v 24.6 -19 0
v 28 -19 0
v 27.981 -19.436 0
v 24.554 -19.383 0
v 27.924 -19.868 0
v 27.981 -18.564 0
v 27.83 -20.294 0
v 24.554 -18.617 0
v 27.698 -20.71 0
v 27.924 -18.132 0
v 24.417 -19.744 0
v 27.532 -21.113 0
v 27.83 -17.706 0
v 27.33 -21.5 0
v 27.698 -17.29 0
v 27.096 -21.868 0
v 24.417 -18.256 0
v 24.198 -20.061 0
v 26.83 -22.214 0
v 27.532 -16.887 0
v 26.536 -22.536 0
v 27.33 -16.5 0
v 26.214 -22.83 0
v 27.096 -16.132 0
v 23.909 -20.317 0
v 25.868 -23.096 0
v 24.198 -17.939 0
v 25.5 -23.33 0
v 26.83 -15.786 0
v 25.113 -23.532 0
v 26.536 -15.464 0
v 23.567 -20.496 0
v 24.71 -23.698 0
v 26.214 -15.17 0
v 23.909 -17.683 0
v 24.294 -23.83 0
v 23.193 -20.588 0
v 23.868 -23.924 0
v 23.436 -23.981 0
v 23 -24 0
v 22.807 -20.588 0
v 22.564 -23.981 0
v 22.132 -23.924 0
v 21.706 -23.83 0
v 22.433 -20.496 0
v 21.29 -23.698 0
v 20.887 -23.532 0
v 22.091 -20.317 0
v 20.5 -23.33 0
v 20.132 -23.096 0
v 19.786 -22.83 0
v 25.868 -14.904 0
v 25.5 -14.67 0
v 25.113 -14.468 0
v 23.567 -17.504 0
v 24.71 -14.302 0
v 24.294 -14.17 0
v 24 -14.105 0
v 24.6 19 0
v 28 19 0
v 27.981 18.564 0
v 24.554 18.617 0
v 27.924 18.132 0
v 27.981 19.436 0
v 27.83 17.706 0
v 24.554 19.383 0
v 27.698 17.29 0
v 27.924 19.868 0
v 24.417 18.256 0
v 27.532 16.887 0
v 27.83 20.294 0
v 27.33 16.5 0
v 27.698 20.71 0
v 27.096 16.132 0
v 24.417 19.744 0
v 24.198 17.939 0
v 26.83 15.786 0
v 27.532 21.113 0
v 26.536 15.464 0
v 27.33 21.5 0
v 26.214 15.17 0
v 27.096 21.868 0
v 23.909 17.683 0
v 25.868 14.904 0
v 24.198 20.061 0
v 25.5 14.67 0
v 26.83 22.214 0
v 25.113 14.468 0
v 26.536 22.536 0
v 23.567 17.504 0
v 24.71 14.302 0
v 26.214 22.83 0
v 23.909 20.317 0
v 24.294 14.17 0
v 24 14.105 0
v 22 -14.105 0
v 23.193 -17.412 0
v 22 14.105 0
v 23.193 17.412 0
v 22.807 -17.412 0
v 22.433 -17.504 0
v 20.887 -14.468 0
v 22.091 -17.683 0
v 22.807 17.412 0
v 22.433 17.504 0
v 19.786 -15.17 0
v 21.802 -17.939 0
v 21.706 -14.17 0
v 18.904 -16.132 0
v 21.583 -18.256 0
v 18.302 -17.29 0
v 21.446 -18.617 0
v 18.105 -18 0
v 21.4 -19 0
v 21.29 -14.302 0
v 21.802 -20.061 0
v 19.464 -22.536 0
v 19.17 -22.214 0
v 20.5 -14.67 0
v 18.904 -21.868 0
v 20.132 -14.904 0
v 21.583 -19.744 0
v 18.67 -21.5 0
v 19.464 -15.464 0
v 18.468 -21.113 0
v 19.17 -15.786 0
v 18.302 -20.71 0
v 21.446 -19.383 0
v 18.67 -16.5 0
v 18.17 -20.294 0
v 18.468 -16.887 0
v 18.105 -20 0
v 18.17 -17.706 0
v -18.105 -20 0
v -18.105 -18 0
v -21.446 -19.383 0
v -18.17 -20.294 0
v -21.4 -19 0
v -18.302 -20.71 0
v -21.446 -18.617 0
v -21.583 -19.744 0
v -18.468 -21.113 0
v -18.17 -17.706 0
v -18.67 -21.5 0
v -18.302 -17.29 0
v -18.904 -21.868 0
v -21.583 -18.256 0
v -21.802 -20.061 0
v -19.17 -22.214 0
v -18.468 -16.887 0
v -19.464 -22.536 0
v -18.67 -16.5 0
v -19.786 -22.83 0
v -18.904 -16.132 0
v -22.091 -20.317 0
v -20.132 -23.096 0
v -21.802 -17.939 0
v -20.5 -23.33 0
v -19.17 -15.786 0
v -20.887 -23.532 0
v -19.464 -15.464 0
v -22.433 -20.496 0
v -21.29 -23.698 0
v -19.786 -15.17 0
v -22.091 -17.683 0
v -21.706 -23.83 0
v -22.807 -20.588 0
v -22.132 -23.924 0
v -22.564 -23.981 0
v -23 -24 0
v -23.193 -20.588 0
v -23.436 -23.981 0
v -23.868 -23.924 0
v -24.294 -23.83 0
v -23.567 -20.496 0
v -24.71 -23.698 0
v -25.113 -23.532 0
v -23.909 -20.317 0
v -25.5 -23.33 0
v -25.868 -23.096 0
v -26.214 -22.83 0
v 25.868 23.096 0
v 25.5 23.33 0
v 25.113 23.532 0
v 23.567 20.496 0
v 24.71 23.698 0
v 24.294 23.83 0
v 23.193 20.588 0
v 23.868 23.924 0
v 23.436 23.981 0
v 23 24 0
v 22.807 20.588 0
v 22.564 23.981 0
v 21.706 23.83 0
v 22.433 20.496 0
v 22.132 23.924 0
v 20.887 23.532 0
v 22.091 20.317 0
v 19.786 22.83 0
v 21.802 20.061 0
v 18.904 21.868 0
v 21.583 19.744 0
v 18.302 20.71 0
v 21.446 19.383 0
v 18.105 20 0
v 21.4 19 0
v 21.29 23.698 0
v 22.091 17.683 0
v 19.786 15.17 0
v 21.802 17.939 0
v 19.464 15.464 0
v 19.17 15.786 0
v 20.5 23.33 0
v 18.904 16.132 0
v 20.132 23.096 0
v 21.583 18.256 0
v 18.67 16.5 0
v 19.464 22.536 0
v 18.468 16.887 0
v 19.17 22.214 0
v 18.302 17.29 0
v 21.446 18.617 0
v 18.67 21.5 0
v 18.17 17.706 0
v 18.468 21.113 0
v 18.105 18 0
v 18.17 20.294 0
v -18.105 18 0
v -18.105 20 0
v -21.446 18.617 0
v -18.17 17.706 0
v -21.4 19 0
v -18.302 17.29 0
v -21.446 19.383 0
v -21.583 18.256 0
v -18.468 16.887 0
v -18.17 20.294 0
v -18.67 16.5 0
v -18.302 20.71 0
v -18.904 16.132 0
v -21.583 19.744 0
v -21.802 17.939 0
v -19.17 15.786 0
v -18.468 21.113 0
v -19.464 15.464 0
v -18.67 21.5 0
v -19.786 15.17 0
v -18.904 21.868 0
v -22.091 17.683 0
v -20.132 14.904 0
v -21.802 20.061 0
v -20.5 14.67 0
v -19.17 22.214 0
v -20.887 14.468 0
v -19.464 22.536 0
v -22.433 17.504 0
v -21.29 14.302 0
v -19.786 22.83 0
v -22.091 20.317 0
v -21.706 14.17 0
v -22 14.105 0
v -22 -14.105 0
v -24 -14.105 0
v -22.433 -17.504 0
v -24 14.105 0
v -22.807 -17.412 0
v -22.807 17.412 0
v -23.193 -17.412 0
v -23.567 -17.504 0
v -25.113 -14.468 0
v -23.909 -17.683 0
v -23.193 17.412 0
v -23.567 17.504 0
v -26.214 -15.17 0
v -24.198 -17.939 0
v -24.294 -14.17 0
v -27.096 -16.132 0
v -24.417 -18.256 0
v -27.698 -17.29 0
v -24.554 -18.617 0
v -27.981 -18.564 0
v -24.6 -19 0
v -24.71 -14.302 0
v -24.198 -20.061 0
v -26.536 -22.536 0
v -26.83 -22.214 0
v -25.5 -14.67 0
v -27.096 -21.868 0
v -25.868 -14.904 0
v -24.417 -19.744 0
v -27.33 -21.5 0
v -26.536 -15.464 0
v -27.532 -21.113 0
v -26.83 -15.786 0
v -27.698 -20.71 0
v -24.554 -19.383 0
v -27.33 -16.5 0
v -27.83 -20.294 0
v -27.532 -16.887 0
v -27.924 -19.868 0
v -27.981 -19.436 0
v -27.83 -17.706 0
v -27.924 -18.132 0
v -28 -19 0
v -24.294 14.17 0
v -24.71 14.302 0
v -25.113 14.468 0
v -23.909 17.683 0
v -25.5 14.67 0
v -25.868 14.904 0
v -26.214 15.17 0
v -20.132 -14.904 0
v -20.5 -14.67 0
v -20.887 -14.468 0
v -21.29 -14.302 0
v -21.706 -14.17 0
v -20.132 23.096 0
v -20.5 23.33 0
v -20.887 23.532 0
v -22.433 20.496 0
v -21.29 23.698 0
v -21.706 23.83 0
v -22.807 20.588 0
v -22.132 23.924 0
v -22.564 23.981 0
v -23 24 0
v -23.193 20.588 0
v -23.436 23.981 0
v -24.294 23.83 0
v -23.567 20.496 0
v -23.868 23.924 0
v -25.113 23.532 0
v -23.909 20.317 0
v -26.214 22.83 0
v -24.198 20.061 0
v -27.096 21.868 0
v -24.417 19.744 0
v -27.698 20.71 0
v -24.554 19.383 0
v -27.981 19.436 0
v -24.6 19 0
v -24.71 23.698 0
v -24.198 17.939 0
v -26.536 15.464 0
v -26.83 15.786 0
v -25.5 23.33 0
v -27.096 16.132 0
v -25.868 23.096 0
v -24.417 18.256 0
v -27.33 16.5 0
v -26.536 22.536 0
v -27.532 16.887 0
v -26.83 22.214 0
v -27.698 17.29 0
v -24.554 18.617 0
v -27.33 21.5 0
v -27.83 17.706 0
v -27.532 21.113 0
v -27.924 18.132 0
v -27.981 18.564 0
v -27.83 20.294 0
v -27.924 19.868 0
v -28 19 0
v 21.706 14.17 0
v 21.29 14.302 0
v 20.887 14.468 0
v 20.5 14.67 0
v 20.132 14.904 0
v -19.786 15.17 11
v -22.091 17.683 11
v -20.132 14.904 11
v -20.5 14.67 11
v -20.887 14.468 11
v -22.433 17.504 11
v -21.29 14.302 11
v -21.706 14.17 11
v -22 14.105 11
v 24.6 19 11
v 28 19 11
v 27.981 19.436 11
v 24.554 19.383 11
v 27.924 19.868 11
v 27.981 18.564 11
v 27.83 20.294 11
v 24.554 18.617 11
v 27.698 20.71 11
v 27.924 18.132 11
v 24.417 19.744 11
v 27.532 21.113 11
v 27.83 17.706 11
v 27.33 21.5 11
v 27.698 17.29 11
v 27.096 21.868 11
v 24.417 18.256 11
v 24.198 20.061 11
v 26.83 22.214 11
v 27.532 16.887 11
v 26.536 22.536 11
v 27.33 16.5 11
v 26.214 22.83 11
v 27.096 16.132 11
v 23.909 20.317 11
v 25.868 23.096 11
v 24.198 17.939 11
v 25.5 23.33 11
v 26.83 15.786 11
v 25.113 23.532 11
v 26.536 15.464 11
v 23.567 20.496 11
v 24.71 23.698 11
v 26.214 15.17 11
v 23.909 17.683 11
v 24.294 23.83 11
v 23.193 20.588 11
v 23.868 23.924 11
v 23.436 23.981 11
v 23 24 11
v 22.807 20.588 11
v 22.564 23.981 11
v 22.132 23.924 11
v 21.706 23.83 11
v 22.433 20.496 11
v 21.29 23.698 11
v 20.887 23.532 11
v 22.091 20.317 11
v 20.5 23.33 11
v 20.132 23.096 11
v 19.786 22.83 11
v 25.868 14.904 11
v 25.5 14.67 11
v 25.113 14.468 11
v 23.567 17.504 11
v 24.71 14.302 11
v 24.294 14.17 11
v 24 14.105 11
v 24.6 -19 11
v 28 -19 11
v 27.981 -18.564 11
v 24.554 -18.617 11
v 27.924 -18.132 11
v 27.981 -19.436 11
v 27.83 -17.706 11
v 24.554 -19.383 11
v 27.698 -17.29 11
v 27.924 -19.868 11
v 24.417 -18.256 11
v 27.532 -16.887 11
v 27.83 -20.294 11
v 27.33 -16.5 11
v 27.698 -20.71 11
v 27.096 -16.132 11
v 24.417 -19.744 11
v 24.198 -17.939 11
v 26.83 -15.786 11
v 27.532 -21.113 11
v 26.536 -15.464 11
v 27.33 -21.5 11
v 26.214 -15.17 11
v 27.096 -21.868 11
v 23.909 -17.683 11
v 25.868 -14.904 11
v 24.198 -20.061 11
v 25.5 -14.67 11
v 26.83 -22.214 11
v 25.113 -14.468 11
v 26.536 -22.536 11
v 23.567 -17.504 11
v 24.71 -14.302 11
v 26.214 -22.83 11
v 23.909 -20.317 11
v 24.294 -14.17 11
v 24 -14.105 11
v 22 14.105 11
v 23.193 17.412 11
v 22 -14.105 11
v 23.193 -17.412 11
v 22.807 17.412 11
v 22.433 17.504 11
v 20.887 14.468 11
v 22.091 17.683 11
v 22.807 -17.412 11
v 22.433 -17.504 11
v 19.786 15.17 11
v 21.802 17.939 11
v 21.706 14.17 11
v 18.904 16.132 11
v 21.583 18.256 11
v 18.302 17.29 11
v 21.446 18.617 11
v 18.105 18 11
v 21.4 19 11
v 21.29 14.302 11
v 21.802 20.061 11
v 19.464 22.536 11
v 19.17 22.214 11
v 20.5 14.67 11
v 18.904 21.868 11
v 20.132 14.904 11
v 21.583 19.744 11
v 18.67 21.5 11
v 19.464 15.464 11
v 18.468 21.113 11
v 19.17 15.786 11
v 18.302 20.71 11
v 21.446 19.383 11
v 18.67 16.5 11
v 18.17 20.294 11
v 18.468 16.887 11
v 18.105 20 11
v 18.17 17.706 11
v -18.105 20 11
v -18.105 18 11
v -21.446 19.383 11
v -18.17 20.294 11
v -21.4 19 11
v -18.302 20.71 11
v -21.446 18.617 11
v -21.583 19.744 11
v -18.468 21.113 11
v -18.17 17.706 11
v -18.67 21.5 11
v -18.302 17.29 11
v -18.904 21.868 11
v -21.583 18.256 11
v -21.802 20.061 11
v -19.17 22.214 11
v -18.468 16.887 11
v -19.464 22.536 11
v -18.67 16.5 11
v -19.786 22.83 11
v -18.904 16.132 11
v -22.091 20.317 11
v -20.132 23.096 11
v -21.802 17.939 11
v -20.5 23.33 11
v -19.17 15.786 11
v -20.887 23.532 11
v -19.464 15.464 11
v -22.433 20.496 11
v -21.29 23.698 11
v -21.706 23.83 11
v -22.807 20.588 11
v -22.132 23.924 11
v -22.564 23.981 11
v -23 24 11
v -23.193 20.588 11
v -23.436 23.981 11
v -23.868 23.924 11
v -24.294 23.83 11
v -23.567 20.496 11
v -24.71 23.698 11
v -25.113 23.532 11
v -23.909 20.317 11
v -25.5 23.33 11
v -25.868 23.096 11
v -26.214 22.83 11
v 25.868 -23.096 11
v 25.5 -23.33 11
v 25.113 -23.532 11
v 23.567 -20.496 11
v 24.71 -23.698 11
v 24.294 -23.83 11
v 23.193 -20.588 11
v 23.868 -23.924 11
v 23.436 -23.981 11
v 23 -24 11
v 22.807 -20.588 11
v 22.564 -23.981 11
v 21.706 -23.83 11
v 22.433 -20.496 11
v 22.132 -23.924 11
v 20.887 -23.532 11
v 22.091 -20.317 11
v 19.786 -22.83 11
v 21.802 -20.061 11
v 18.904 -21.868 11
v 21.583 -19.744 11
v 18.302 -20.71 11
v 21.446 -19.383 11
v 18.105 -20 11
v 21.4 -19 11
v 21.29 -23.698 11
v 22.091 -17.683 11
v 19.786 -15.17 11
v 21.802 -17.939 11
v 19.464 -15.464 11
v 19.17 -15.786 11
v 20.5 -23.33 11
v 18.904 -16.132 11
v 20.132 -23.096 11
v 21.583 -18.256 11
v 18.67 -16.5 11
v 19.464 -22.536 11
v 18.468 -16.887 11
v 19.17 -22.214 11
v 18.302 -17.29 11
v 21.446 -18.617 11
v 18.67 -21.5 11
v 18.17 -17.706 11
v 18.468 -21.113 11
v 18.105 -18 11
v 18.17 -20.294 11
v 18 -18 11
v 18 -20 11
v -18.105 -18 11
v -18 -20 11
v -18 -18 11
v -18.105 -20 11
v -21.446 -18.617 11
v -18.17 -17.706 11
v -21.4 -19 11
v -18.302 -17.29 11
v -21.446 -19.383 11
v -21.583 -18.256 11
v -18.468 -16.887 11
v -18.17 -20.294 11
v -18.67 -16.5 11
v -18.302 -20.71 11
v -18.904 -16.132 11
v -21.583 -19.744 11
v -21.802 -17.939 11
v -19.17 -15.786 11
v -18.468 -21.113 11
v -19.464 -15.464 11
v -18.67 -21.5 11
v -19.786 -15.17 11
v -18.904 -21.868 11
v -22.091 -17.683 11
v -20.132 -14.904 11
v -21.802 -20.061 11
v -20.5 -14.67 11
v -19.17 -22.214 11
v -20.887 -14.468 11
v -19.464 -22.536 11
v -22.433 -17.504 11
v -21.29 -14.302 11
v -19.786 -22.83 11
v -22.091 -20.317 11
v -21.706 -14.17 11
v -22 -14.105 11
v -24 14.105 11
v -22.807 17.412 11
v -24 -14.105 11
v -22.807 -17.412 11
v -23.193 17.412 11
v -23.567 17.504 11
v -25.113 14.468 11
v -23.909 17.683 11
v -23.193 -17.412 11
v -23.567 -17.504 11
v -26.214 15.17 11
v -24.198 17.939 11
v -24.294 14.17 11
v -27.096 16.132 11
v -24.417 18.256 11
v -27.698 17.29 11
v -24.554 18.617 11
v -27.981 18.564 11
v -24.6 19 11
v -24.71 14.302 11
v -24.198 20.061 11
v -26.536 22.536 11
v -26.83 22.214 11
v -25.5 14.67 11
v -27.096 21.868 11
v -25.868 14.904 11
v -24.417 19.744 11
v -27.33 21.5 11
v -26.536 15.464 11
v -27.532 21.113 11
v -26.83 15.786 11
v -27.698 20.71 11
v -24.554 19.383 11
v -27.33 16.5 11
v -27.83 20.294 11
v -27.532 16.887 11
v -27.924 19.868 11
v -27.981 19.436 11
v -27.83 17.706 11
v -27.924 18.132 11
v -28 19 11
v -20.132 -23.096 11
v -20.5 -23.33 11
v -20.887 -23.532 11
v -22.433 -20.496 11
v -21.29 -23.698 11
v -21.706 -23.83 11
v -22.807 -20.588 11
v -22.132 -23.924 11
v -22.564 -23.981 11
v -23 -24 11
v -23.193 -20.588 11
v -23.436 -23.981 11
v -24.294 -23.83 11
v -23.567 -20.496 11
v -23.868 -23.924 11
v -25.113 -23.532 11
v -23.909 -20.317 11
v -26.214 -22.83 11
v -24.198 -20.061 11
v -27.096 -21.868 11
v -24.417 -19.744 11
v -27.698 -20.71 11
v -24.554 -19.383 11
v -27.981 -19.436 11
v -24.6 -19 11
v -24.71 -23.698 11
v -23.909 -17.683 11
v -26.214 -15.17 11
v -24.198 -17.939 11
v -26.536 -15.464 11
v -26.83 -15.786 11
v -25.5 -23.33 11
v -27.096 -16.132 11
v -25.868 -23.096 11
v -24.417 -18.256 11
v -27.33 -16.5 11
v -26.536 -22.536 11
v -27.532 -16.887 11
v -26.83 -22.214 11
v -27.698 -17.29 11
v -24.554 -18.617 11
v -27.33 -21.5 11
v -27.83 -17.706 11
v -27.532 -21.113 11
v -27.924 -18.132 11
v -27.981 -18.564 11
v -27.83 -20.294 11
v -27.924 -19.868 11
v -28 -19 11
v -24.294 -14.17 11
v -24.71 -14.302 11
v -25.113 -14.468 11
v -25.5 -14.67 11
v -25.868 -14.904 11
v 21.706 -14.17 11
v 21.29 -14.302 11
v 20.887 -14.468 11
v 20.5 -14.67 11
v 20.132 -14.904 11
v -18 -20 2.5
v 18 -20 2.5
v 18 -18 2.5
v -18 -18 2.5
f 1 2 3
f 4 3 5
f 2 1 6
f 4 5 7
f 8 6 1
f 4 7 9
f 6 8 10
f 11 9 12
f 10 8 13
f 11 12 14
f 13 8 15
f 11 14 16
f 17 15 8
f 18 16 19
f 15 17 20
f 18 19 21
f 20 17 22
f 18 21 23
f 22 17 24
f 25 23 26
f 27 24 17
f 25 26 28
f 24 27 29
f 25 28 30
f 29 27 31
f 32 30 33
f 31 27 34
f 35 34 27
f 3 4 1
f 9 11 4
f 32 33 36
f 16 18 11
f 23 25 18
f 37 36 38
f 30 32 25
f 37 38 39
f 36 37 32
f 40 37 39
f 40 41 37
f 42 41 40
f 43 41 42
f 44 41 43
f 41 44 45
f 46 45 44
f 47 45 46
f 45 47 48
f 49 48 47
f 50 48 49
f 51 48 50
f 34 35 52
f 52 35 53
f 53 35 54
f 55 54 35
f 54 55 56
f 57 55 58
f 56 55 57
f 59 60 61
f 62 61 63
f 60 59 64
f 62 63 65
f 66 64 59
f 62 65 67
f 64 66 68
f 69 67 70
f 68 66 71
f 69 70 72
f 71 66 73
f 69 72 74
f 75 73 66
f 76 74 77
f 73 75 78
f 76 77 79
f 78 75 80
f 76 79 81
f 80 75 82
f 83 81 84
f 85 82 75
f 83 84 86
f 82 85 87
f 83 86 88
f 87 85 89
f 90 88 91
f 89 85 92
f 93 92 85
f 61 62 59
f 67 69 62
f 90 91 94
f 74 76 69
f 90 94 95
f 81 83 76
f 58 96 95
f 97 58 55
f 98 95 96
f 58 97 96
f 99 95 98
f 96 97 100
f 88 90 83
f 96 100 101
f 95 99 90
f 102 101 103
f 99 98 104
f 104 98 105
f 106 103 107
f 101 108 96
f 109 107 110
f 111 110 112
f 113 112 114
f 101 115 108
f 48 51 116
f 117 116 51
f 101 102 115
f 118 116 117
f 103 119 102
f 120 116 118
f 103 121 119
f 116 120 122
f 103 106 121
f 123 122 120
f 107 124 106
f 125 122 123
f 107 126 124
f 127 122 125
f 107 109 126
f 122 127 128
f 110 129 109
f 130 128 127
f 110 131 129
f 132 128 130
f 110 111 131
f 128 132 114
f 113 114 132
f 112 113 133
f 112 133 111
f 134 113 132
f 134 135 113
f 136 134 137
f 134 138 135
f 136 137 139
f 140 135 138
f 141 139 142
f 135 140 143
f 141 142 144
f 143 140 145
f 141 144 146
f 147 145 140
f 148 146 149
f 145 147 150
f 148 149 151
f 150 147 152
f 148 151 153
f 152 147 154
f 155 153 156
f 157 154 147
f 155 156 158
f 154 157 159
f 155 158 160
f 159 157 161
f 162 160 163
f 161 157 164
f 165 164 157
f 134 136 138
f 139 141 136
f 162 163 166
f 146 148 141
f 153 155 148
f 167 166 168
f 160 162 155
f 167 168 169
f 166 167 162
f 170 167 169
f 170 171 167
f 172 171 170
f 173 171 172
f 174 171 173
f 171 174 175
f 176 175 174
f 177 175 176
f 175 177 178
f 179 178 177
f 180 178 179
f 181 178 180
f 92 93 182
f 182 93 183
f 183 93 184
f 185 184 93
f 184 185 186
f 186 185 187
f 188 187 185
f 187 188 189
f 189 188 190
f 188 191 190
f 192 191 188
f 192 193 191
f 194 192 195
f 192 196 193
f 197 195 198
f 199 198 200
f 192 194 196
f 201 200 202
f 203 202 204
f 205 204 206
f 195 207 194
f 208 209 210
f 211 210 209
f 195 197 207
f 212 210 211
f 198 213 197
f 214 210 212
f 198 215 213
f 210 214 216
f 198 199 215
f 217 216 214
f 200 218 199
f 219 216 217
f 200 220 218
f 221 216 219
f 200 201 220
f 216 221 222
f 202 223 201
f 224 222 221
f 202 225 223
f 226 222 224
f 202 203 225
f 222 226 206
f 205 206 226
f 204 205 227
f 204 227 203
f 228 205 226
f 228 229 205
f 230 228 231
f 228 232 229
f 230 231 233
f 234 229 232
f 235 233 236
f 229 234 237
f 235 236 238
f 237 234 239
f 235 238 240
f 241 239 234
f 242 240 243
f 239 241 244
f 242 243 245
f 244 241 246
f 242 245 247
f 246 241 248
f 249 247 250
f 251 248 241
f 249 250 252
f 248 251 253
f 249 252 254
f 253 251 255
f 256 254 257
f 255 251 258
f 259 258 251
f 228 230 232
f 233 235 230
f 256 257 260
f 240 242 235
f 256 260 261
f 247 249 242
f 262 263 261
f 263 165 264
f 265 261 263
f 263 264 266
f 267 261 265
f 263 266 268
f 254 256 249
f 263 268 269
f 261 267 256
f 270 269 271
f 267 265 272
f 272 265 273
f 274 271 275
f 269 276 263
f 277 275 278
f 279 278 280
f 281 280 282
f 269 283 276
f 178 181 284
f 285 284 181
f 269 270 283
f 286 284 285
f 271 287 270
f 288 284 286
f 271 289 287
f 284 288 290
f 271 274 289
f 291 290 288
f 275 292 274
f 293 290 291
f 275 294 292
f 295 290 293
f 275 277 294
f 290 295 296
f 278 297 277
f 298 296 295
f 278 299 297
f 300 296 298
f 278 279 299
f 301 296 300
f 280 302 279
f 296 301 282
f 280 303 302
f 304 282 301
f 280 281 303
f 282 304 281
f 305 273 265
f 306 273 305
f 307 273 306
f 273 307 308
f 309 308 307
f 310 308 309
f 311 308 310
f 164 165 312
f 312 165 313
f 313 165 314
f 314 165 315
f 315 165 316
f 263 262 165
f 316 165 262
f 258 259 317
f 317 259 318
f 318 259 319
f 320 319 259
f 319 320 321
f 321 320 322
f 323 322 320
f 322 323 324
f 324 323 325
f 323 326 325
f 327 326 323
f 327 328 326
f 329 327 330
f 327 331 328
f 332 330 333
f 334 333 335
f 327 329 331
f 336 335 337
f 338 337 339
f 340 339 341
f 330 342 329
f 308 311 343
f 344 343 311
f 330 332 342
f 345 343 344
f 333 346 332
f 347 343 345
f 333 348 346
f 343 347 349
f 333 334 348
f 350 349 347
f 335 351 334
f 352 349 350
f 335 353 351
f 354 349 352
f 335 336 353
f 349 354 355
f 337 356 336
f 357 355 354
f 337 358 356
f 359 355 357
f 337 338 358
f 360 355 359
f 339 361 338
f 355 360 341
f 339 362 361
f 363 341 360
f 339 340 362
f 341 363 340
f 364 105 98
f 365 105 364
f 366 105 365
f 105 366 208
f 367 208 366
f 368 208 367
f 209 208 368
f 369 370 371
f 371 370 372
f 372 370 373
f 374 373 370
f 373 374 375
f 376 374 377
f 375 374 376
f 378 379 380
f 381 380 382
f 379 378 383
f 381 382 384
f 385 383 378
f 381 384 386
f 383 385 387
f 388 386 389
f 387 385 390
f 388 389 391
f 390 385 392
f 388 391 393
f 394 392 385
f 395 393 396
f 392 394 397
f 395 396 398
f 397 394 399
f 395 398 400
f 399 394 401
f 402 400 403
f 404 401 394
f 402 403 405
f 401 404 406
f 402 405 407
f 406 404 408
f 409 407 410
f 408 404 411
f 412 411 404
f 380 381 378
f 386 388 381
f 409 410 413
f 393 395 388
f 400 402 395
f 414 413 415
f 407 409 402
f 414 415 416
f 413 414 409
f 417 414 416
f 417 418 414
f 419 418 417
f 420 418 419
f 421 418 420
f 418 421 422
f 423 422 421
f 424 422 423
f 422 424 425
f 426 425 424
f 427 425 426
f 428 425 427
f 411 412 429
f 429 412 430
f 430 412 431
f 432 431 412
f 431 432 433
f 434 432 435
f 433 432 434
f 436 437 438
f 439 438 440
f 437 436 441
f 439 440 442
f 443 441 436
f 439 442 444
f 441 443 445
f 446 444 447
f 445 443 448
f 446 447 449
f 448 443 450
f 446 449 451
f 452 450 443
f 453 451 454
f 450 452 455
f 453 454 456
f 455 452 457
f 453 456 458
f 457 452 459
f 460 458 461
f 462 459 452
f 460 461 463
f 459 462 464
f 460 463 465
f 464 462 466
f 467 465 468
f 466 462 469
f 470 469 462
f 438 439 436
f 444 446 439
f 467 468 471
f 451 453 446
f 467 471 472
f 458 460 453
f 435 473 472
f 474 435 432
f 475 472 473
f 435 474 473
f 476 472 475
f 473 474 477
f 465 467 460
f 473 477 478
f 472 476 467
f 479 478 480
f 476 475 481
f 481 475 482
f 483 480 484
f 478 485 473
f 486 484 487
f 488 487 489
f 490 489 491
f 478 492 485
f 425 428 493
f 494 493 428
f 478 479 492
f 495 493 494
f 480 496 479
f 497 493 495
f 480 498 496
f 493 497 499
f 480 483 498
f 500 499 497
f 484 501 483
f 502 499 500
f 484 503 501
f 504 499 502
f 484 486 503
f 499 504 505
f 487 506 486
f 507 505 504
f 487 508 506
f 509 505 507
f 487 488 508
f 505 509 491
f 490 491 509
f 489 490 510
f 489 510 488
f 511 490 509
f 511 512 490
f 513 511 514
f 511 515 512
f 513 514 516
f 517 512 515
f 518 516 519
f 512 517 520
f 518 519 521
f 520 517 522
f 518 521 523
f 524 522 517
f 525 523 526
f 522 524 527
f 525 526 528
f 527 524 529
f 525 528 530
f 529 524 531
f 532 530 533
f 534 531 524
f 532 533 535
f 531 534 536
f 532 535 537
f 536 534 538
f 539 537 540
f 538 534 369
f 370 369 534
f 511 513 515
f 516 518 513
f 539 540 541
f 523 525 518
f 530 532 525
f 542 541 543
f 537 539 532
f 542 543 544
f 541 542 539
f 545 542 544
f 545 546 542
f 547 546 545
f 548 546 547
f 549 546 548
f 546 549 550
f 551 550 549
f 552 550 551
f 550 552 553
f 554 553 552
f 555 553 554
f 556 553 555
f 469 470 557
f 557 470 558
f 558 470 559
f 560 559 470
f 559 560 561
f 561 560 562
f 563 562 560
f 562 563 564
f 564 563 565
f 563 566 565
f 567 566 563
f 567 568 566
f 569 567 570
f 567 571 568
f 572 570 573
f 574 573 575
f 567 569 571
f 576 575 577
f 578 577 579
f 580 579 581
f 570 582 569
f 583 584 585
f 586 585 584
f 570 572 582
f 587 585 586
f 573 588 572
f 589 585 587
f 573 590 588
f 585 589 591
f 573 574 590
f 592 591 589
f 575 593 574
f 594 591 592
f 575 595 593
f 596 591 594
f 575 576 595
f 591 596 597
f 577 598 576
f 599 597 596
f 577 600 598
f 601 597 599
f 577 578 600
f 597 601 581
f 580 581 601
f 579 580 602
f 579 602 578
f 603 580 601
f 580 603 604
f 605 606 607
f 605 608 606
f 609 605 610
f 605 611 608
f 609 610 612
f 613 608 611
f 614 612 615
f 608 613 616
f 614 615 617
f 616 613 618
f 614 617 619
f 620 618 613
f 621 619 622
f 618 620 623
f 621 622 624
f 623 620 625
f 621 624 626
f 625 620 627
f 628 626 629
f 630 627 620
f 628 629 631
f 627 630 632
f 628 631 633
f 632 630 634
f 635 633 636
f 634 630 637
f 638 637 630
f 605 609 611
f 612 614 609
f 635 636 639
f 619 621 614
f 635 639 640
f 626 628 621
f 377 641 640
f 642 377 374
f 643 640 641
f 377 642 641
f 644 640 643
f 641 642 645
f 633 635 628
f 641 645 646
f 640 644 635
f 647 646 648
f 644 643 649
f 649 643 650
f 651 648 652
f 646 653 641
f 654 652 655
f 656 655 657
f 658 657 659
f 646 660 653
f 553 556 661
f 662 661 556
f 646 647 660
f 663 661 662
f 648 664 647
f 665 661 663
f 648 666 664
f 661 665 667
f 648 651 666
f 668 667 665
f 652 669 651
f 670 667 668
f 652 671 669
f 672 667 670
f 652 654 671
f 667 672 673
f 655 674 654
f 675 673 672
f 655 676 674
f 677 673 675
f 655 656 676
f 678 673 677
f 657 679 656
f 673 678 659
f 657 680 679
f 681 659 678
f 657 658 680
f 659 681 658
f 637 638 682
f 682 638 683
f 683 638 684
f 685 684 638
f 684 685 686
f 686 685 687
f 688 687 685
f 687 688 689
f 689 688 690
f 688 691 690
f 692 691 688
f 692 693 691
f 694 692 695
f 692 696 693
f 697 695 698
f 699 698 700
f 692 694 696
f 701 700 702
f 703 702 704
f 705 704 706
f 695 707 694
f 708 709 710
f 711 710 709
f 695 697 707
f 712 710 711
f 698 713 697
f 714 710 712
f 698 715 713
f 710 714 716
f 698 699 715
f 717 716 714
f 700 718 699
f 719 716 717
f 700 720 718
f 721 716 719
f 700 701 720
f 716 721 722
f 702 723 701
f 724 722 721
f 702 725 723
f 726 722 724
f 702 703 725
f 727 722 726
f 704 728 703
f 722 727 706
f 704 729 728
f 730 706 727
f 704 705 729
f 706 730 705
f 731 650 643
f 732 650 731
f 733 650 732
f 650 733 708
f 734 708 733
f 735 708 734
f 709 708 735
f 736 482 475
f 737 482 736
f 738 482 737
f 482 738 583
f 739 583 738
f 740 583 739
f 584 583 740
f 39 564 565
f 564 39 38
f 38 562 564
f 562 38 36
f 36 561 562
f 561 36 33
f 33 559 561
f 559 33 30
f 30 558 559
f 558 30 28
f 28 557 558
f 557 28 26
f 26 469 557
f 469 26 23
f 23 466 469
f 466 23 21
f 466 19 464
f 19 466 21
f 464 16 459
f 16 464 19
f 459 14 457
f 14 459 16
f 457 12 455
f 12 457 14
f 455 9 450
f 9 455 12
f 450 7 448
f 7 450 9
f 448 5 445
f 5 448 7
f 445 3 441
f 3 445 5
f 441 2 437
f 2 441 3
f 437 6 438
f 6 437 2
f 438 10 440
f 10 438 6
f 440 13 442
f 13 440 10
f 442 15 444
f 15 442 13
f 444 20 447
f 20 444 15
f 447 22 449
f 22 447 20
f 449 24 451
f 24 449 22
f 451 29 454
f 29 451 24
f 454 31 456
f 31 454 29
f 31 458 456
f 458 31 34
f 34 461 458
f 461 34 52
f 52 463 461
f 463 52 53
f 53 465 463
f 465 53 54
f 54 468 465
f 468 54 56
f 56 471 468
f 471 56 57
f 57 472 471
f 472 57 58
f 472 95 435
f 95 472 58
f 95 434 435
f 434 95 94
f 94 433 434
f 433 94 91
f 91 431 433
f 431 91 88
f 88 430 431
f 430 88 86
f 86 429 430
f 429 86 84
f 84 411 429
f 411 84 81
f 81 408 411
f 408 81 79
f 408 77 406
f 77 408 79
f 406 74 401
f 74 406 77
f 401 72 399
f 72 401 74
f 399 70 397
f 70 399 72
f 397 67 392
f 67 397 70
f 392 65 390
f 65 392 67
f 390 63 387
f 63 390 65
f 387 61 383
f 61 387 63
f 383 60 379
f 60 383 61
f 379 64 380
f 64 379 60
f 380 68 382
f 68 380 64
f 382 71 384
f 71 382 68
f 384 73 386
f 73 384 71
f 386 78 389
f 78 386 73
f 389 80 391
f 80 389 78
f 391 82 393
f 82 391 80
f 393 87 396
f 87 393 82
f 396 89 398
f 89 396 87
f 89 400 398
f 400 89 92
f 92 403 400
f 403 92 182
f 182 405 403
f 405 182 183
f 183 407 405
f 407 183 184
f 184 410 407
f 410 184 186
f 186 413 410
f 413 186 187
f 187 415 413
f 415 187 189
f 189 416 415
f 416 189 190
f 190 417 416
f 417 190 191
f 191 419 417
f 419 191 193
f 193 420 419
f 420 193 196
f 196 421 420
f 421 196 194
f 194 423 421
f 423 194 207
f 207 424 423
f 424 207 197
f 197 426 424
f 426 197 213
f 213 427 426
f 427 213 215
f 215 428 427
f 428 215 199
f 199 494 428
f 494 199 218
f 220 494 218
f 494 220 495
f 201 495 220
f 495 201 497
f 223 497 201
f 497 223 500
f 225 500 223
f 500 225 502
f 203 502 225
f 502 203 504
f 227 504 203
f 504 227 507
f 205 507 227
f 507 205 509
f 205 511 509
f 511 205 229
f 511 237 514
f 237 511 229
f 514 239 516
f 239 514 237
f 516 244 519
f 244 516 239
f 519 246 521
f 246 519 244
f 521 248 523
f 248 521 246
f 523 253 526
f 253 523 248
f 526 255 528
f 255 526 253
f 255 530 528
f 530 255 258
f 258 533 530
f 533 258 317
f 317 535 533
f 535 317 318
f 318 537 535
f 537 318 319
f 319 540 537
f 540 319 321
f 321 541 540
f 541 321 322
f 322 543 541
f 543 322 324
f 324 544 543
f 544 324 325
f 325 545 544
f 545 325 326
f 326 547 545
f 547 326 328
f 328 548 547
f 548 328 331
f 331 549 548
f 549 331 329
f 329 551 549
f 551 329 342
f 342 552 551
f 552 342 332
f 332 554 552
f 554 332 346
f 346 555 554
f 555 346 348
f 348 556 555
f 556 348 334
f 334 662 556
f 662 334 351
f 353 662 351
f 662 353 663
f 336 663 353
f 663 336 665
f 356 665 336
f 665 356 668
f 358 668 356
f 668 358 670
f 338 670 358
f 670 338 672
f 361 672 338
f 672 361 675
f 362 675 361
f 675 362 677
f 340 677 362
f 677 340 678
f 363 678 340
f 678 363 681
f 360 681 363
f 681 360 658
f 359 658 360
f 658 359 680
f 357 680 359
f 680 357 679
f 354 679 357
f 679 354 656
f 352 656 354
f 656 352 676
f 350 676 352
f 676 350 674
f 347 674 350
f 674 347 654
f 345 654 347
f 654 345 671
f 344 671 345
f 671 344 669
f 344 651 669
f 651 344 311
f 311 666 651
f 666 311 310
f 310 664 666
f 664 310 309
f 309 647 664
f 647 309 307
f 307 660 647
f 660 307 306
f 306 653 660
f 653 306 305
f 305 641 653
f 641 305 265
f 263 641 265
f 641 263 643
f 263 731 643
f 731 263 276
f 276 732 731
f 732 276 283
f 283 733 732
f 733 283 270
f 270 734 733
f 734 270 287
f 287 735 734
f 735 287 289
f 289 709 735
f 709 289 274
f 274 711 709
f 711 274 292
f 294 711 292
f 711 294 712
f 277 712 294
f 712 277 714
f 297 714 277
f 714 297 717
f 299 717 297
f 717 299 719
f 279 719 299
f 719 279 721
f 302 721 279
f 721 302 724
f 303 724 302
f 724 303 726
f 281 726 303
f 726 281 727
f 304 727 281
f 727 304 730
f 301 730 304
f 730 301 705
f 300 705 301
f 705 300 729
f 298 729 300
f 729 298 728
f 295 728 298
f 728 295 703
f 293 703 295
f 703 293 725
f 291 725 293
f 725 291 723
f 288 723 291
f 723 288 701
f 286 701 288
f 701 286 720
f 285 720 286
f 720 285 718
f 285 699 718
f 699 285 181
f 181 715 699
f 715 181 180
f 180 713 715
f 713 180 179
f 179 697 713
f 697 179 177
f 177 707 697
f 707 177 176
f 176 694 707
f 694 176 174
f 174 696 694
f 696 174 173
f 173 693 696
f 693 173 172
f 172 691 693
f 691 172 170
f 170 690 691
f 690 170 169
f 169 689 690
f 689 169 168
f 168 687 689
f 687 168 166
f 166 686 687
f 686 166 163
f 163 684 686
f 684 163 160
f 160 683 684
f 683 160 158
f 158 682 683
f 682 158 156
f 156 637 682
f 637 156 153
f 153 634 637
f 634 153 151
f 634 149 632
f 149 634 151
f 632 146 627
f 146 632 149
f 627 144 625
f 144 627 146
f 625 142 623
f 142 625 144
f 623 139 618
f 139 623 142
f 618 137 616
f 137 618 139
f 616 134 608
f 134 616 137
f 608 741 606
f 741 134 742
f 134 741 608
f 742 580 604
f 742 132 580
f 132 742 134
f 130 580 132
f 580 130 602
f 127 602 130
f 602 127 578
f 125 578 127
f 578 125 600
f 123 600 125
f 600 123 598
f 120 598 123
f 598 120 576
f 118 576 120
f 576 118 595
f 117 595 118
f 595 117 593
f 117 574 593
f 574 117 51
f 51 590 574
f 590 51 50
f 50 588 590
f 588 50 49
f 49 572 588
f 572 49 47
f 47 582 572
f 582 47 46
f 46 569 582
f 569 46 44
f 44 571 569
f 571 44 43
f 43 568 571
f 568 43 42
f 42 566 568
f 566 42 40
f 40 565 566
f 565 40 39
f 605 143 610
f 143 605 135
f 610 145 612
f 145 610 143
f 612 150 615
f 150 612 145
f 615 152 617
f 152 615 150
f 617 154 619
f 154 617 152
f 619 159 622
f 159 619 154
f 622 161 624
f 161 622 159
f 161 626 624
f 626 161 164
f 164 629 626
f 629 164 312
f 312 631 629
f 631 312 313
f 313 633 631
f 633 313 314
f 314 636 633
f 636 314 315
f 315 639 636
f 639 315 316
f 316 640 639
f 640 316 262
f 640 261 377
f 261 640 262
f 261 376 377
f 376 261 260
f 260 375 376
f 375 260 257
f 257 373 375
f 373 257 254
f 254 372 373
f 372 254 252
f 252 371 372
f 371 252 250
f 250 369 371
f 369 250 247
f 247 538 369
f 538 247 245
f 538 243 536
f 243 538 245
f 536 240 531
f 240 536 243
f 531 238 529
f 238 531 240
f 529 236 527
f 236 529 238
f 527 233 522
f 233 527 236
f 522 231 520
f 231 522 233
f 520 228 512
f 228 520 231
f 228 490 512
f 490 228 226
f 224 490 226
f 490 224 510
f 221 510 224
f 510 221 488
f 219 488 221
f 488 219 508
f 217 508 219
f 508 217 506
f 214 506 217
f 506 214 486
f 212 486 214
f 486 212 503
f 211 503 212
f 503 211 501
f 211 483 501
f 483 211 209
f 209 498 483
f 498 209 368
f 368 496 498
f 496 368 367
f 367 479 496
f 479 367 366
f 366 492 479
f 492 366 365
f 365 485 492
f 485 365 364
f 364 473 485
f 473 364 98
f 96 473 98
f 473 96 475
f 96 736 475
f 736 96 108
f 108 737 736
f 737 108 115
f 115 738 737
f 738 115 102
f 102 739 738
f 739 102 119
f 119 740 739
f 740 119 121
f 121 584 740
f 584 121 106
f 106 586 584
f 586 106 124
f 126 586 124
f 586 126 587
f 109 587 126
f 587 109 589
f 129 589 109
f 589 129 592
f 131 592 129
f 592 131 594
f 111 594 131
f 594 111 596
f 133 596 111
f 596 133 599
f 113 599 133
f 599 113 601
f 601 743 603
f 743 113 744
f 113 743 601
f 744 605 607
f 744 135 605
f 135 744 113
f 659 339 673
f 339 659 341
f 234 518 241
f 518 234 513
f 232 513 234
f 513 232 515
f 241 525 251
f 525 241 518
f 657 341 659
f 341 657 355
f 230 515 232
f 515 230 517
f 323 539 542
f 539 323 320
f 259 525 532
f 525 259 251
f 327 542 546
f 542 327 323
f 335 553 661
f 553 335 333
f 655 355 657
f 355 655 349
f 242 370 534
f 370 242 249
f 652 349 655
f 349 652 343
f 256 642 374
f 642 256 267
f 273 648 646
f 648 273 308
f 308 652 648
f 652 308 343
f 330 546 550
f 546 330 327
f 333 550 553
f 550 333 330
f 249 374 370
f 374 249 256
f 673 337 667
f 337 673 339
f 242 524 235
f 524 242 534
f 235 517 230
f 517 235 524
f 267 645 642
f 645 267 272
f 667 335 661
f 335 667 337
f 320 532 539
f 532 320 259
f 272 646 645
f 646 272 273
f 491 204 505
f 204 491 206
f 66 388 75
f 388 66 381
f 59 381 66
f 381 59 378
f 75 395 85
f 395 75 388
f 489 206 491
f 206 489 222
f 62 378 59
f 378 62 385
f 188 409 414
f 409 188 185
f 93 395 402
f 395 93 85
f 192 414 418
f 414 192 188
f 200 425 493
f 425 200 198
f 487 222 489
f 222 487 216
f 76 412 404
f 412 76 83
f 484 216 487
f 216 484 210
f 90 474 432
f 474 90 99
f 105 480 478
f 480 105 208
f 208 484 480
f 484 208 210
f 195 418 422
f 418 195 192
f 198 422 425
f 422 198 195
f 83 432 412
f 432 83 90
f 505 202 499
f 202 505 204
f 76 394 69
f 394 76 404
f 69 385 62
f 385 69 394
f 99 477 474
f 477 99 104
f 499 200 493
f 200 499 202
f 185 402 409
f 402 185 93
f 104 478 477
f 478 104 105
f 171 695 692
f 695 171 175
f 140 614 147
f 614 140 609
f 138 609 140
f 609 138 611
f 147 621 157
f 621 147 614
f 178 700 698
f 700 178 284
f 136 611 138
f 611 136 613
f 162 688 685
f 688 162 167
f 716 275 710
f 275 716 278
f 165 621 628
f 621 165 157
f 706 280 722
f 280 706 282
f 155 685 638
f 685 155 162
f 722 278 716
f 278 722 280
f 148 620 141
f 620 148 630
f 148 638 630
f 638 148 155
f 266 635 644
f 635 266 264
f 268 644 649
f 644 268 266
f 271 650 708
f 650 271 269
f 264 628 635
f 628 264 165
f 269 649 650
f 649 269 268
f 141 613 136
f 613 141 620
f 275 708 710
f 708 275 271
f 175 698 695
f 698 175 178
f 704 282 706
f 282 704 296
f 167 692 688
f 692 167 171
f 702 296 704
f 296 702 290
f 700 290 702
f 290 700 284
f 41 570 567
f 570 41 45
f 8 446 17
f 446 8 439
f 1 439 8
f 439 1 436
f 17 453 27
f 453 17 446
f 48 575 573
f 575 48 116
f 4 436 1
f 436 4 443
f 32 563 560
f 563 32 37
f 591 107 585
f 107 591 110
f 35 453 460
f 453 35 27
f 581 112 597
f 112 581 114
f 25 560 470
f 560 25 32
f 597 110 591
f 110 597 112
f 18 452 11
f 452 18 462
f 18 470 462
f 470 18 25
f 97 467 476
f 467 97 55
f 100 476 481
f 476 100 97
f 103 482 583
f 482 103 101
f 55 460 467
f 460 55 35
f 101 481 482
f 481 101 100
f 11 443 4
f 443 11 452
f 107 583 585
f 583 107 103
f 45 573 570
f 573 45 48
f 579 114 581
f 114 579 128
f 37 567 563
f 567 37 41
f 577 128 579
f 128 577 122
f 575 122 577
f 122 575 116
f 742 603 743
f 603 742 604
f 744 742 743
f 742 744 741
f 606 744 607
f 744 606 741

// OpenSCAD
//$fn=60;
$fa=5;
$fs=.4;

holeA = [-23,19,0];
holeB = [23,19,0];
holeC = [-23,-19,0];
holeD = [23,-19,0];

 
difference(){
    base_shape();
    insert_hole(holeA);
    insert_hole(holeB);
    insert_hole(holeC);
    insert_hole(holeD);
    translate([0,-20,7]) cube([36,36,9],center=true);
}



module insert_hole(place){
    translate([place[0],place[1],0]){
        //translate([0,0,0.8]) cylinder(h=6,d=5.2);
        translate([0,0,-0.8]) cylinder(h=16,d=3.2);
    }
}


module base_shape(){
    linear_extrude(height=11){
        translate(holeA) circle(d=10);
        translate(holeB) circle(d=10);
        translate(holeC) circle(d=10);
        translate(holeD) circle(d=10);
        difference(){
            square([48,40],center=true);
            square([44,36],center=true);
        }
    }
}
